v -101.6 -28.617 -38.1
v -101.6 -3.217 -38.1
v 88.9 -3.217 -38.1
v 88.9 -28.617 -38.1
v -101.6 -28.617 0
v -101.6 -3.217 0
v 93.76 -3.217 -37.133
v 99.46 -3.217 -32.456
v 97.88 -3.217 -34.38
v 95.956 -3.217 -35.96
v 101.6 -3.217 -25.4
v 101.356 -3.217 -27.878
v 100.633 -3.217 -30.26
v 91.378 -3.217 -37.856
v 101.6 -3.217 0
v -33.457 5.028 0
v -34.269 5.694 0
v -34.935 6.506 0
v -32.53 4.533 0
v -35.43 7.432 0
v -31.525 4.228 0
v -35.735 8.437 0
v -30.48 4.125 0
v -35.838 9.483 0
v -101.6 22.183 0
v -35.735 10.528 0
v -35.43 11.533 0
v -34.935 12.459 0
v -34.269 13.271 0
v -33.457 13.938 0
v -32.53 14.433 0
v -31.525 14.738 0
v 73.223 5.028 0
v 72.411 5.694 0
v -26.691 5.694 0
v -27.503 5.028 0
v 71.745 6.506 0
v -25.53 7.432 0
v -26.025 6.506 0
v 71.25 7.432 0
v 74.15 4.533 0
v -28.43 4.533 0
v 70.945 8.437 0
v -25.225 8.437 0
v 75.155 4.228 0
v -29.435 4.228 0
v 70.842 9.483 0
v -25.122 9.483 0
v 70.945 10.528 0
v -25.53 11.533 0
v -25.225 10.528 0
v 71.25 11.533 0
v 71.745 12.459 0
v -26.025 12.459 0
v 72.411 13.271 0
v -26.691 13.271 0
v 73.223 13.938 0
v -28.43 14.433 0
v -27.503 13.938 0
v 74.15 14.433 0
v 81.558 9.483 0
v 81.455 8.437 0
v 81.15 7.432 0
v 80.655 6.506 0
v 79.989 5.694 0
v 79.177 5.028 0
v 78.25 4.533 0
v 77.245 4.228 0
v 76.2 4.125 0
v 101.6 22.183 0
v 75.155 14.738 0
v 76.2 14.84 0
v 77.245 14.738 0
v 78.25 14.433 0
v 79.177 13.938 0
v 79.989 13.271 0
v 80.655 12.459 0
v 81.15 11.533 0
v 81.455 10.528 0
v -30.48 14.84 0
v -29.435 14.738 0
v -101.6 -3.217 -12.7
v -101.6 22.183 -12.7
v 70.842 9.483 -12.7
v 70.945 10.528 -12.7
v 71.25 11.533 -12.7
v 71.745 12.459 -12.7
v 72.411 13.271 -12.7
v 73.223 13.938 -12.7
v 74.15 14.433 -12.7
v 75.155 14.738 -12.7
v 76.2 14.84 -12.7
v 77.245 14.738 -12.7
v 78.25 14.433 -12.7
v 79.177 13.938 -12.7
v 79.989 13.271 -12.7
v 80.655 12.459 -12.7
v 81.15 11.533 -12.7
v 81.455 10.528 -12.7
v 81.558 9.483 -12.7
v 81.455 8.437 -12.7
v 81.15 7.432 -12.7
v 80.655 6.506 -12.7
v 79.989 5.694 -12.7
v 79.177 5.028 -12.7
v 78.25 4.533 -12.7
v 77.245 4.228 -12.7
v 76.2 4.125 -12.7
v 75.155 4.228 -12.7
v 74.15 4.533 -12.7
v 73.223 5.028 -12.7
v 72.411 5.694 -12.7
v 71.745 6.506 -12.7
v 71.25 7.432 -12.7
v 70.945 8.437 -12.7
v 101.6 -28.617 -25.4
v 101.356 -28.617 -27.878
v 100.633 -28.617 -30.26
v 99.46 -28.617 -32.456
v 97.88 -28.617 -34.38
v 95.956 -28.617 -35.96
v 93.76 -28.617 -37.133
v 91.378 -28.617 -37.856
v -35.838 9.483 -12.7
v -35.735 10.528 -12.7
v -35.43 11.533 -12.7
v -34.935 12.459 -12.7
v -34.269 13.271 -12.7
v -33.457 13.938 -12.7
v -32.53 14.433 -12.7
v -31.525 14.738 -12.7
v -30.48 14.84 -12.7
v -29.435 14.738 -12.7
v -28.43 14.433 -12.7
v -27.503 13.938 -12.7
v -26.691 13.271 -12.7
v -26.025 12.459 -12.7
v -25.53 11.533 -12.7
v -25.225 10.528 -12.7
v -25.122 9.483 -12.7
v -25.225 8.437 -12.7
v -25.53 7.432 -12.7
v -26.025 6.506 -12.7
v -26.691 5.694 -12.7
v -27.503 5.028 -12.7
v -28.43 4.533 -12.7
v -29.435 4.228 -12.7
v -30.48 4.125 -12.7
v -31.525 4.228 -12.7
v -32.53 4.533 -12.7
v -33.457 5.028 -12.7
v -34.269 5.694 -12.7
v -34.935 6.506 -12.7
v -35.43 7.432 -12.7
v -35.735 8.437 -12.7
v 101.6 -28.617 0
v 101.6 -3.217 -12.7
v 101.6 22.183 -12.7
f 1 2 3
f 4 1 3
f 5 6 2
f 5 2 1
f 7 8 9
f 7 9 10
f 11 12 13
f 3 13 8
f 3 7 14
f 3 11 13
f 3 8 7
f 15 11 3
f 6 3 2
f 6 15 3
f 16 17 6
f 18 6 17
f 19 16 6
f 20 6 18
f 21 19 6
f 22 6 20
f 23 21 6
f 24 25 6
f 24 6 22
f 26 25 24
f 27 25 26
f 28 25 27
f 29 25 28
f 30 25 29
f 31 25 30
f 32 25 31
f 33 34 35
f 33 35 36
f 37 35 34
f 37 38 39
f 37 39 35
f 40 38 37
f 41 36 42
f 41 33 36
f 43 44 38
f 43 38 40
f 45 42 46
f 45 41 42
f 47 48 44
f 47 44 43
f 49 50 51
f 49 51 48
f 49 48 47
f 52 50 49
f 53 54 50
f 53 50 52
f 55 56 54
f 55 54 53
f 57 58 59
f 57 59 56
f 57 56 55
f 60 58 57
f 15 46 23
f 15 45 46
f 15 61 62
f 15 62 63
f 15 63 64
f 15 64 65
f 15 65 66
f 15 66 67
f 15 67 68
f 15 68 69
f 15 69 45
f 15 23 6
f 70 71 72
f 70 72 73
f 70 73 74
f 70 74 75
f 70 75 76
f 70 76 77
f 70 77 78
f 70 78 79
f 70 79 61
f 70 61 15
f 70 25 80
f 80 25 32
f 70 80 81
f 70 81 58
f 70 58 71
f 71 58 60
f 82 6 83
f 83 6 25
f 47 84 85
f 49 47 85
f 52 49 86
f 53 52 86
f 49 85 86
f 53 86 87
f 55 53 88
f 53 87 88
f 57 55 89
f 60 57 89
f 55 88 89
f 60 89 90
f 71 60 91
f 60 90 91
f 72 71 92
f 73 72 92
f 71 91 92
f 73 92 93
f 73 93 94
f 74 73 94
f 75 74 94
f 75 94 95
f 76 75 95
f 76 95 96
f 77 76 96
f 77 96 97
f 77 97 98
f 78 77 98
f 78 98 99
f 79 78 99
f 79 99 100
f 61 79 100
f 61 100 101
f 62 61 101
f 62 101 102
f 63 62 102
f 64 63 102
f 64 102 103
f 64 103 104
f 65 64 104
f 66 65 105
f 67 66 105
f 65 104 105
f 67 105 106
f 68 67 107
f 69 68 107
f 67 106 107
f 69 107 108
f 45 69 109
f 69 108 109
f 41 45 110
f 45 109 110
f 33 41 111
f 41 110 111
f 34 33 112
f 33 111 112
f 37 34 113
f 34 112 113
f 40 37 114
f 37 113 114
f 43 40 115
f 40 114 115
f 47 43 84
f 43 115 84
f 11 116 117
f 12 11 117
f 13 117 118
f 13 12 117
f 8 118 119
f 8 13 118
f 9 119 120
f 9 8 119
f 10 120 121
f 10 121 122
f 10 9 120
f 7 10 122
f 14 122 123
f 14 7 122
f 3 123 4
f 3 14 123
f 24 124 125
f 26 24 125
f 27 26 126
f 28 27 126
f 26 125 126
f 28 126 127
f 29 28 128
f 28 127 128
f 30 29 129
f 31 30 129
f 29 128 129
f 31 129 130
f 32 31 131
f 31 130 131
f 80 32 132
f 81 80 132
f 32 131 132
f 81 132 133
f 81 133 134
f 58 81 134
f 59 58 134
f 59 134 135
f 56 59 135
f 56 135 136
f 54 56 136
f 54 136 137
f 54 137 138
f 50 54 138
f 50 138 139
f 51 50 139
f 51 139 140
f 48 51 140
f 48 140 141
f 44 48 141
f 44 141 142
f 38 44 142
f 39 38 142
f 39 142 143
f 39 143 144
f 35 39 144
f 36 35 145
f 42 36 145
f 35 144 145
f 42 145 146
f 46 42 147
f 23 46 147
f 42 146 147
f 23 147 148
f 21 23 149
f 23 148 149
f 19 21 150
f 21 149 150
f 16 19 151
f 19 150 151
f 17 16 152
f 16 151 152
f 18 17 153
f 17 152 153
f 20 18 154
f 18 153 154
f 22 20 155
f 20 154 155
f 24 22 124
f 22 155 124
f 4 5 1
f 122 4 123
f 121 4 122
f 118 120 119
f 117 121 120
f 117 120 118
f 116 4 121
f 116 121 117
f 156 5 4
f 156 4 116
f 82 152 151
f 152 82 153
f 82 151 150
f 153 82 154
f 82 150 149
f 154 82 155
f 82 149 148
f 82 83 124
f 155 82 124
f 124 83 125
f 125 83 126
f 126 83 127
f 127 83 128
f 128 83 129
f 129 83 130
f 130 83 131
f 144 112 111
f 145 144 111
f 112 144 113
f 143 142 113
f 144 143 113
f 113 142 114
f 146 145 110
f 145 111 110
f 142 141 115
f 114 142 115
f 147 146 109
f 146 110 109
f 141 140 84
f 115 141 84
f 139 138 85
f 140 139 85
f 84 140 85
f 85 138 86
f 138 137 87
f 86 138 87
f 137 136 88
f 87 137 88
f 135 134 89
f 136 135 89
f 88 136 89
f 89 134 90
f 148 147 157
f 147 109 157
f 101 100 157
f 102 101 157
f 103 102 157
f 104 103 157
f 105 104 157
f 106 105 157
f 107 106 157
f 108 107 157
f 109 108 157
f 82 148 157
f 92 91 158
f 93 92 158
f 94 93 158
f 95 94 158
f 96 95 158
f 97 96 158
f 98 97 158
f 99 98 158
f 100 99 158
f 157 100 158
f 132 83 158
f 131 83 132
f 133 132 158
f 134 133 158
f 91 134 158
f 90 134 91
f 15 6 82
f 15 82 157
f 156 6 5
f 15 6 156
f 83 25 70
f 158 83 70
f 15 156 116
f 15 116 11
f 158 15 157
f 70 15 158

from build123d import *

# Parameters (mm, degrees)
F0_W     = 203.2
F0_H     = 25.4
F1_DEPTH = 12.7
F2_DEPTH = 38.1
F4_D     = 10.715625
F4_DEPTH = 50.8
F4_TIP   = 3.2192985354
F5_R     = 12.7


with BuildPart() as f1:
    # F0 (on Top) → F1 (new body)
    with BuildSketch(Plane.XY):
        with Locations((0, 9.4826666179)):
            Rectangle(F0_W, F0_H)
    extrude(amount=-F1_DEPTH)

    # F4
    with Locations(Plane.XY):
        with Locations((-30.48, 9.4826666179), (76.2, 9.4826666179)):
            Hole(F4_D / 2, depth=F4_DEPTH)
            with Locations((0, 0, -(F4_DEPTH + F4_TIP / 2))):  # 118° drill point
                Cone(0, F4_D / 2, F4_TIP, mode=Mode.SUBTRACT)


with BuildPart() as f2:
    # F0 (on Top) → F2 (new body)
    with BuildSketch(Plane.XY):
        Polygon((101.6, -3.2173333821), (-101.6, -3.2173333821), (-101.6, -28.6173333821), (88.9, -28.6173333821), (101.6, -28.6173333821), (101.6, -15.9173333821), align=None)
    extrude(amount=-F2_DEPTH)

    # F5
    f5_edges = [f2.edges().sort_by_distance(p)[0] for p in [
        (101.6, -15.917333, -38.1),
    ]]
    fillet(f5_edges, radius=F5_R)


solid = Compound([f1.part, f2.part])
